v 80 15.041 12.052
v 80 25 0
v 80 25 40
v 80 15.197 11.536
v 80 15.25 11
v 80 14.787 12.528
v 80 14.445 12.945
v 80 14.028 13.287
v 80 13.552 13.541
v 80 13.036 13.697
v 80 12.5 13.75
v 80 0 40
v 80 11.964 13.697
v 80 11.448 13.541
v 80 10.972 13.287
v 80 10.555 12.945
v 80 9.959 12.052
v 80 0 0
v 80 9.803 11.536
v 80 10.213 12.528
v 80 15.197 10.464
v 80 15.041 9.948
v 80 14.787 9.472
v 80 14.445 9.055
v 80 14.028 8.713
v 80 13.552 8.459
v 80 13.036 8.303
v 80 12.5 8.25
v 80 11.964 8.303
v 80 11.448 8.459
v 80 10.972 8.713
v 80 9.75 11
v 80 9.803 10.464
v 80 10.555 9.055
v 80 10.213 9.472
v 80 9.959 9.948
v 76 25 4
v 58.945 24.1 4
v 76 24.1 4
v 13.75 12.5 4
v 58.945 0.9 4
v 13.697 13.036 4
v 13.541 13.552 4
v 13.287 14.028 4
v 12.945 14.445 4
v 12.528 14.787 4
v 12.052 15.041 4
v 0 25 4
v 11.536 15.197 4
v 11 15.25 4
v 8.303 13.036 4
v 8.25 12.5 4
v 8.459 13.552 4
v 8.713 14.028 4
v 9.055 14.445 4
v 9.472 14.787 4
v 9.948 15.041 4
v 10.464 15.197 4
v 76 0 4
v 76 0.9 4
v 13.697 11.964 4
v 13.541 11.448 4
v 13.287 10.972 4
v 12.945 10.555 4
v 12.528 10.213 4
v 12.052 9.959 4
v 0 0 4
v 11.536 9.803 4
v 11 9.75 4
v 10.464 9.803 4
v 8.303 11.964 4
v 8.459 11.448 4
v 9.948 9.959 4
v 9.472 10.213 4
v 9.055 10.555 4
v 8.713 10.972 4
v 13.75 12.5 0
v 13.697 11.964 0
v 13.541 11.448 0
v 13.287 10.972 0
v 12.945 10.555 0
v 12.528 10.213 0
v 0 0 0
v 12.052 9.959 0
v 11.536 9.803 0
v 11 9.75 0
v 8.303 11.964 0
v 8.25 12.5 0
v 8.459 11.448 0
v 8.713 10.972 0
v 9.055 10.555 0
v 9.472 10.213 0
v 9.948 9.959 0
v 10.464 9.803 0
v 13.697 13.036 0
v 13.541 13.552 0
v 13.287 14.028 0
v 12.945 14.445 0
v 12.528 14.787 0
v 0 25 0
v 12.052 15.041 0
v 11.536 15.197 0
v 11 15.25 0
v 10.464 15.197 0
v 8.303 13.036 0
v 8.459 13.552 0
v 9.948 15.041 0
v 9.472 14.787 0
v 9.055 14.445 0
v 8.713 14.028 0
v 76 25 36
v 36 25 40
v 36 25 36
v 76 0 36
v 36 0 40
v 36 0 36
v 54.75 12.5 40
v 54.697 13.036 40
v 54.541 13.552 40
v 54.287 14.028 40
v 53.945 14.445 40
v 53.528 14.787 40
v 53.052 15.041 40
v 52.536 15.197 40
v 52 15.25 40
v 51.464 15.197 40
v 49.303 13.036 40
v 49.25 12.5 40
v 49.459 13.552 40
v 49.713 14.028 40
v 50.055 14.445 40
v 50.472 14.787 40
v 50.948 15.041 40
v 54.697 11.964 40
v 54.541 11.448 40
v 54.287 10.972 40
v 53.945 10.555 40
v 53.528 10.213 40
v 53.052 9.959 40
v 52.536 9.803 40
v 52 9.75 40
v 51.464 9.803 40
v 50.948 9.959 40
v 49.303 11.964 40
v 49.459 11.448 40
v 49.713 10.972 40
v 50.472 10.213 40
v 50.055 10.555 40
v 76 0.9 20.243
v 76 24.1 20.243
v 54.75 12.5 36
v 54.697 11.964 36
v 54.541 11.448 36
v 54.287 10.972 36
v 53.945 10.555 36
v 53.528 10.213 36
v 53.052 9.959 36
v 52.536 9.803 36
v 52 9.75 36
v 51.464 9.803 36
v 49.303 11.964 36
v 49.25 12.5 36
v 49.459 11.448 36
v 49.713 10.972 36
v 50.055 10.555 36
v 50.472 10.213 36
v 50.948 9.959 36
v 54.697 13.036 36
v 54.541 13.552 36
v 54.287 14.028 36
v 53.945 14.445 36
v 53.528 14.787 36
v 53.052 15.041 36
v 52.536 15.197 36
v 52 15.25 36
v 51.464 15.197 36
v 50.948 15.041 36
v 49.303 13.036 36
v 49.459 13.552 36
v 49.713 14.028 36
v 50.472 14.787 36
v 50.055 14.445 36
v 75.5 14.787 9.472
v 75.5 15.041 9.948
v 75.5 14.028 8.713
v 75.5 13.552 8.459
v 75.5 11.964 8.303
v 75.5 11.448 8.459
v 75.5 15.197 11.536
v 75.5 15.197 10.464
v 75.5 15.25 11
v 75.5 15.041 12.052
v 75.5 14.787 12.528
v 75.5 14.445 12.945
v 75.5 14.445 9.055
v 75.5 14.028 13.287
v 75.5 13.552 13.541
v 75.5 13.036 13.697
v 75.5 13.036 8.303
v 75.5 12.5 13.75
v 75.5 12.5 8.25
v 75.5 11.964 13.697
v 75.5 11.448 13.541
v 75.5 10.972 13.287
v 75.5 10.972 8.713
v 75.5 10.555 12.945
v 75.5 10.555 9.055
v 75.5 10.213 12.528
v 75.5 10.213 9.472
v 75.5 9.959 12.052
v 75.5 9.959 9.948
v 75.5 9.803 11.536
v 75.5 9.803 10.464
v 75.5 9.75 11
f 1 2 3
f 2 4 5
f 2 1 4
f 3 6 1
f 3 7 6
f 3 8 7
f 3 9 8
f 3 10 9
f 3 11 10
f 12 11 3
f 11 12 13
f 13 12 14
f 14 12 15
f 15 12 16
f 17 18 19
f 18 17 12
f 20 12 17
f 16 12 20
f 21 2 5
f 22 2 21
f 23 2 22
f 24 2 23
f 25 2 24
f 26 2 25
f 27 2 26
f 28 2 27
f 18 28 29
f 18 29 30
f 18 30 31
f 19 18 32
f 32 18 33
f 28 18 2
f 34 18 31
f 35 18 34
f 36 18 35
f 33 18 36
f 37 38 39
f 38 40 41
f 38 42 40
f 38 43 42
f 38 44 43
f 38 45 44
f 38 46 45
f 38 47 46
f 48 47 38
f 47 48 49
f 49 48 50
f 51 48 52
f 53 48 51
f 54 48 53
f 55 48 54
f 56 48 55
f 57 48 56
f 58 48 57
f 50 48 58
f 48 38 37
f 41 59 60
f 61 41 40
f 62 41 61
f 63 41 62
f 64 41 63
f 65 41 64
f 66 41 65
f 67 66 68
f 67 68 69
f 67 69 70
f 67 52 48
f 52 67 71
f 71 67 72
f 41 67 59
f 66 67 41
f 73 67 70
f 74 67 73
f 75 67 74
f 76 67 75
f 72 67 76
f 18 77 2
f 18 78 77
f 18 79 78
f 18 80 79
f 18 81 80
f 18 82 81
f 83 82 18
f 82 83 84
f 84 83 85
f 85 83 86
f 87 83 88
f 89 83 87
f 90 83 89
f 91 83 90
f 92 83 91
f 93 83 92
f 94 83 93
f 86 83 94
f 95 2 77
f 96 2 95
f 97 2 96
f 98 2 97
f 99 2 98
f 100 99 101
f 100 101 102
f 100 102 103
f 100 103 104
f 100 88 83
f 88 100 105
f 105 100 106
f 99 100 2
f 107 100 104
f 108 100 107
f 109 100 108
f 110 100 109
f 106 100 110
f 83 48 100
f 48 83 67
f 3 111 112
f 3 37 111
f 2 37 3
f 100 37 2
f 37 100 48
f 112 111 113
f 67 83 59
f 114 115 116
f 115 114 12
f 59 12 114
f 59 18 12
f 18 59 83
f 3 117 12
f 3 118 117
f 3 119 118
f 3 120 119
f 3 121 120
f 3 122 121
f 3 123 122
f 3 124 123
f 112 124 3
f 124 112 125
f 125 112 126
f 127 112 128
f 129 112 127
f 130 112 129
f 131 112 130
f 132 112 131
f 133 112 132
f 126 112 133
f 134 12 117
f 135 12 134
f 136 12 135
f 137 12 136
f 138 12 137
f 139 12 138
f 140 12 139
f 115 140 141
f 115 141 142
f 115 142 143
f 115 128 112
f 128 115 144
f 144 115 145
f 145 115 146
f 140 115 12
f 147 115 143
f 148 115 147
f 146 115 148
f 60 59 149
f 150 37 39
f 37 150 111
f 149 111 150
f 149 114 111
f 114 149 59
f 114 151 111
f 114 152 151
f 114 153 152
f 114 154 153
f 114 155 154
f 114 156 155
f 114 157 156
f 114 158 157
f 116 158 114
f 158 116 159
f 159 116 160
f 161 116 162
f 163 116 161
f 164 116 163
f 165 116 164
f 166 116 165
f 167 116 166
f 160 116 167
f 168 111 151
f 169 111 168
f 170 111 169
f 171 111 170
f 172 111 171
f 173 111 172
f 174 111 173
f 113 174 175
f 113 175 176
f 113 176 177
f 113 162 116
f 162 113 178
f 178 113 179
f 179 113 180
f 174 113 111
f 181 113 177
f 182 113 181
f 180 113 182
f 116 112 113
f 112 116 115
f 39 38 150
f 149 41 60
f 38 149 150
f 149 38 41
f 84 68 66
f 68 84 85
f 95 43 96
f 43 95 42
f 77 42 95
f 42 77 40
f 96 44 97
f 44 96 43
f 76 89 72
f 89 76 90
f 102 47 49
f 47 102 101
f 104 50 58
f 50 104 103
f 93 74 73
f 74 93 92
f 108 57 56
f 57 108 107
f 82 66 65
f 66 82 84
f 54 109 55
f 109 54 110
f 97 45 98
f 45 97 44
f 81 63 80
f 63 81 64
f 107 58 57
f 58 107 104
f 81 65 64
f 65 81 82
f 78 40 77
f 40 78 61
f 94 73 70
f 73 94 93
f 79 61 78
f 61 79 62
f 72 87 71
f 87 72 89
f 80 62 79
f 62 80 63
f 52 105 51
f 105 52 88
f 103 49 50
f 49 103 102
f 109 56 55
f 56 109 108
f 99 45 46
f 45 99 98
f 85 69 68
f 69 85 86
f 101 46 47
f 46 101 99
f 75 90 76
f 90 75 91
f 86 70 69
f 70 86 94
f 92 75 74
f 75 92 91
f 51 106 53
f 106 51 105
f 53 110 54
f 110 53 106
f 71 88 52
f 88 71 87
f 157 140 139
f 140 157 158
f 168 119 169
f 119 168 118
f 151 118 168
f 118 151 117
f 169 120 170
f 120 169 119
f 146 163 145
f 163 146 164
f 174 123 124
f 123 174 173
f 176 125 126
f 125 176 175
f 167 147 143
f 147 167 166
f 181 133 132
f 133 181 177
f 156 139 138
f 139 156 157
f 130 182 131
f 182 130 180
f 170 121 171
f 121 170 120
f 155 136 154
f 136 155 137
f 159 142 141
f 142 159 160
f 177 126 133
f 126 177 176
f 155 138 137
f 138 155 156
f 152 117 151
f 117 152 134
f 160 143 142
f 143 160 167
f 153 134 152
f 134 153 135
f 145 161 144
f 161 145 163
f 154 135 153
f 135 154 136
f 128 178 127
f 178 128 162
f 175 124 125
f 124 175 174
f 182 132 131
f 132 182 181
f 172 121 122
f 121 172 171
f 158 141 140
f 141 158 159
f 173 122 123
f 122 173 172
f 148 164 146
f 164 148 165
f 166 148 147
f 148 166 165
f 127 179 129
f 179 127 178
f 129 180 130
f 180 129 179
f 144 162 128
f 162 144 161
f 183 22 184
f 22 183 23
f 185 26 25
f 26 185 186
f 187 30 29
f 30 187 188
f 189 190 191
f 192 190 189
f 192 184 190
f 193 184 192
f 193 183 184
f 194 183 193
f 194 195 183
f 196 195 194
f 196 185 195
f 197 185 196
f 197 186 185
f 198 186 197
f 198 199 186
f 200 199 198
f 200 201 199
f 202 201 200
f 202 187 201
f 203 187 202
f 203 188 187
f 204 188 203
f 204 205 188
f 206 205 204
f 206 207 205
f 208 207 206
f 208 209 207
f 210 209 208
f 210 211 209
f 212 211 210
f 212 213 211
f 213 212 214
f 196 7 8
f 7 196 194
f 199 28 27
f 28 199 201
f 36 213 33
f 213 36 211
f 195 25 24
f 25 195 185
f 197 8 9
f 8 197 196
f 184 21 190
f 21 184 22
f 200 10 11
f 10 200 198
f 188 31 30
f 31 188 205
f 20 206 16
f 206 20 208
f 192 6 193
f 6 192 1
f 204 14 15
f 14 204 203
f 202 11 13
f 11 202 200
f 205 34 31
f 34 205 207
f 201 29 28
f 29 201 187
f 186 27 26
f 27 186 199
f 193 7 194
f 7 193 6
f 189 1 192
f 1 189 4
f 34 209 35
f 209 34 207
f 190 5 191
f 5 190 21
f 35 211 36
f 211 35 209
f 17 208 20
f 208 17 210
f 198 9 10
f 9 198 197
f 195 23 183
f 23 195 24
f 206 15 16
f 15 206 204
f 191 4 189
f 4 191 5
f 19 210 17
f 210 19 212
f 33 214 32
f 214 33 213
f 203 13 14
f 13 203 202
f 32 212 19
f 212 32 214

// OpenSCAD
$fn = 32;

// ----------------------------------------------------------------------
// Z-bracket: 80 x 25 x 40 mm
// ----------------------------------------------------------------------

// --- parameters (mm) ---
foot_len = 80;            // lower foot length, X
top_len = 40;             // upper foot length, X
depth = 25;               // bracket width, Y
step_h = 40;              // overall rise, Z
plate_t = 4;              // plate thickness
hole_d = 5.5;             // clearance for M5
rib_len = 18;             // gusset leg
rib_sink = 0.9;           // gusset overlap into the plates

module hole_z(px, py, z0) {
  translate([px, py, z0 - 0.5]) cylinder(h = plate_t + 1, d = hole_d);
}
module hole_x(py, pz) {
  translate([-0.5, py, pz]) rotate([0, 90, 0]) cylinder(h = plate_t + 1, d = hole_d);
}
module gusset(x0) {
  translate([x0, depth - rib_sink, 0])
    rotate([90, 0, 0])
      linear_extrude(height = depth - 2 * rib_sink)
        polygon(points = [[rib_sink, plate_t - rib_sink],
                          [rib_sink, plate_t - rib_sink + rib_len],
                          [-rib_len, plate_t - rib_sink]]);
}

difference() {
  union() {
    cube([foot_len, depth, plate_t]);
    /* web, overlapping the lower foot */
    translate([foot_len - plate_t, 0, 0]) cube([plate_t, depth, step_h]);
    /* upper foot, sunk into the web */
    translate([foot_len - plate_t - top_len, 0, step_h - plate_t]) cube([top_len + plate_t, depth, plate_t]);
    gusset(foot_len - plate_t);
  }
  hole_z(11, 12.5, 0);
  translate([foot_len - plate_t - 24, 0, 0]) hole_z(0, 12.5, step_h - plate_t);
  translate([foot_len - plate_t, 0, 0]) hole_x(12.5, 11);
}
